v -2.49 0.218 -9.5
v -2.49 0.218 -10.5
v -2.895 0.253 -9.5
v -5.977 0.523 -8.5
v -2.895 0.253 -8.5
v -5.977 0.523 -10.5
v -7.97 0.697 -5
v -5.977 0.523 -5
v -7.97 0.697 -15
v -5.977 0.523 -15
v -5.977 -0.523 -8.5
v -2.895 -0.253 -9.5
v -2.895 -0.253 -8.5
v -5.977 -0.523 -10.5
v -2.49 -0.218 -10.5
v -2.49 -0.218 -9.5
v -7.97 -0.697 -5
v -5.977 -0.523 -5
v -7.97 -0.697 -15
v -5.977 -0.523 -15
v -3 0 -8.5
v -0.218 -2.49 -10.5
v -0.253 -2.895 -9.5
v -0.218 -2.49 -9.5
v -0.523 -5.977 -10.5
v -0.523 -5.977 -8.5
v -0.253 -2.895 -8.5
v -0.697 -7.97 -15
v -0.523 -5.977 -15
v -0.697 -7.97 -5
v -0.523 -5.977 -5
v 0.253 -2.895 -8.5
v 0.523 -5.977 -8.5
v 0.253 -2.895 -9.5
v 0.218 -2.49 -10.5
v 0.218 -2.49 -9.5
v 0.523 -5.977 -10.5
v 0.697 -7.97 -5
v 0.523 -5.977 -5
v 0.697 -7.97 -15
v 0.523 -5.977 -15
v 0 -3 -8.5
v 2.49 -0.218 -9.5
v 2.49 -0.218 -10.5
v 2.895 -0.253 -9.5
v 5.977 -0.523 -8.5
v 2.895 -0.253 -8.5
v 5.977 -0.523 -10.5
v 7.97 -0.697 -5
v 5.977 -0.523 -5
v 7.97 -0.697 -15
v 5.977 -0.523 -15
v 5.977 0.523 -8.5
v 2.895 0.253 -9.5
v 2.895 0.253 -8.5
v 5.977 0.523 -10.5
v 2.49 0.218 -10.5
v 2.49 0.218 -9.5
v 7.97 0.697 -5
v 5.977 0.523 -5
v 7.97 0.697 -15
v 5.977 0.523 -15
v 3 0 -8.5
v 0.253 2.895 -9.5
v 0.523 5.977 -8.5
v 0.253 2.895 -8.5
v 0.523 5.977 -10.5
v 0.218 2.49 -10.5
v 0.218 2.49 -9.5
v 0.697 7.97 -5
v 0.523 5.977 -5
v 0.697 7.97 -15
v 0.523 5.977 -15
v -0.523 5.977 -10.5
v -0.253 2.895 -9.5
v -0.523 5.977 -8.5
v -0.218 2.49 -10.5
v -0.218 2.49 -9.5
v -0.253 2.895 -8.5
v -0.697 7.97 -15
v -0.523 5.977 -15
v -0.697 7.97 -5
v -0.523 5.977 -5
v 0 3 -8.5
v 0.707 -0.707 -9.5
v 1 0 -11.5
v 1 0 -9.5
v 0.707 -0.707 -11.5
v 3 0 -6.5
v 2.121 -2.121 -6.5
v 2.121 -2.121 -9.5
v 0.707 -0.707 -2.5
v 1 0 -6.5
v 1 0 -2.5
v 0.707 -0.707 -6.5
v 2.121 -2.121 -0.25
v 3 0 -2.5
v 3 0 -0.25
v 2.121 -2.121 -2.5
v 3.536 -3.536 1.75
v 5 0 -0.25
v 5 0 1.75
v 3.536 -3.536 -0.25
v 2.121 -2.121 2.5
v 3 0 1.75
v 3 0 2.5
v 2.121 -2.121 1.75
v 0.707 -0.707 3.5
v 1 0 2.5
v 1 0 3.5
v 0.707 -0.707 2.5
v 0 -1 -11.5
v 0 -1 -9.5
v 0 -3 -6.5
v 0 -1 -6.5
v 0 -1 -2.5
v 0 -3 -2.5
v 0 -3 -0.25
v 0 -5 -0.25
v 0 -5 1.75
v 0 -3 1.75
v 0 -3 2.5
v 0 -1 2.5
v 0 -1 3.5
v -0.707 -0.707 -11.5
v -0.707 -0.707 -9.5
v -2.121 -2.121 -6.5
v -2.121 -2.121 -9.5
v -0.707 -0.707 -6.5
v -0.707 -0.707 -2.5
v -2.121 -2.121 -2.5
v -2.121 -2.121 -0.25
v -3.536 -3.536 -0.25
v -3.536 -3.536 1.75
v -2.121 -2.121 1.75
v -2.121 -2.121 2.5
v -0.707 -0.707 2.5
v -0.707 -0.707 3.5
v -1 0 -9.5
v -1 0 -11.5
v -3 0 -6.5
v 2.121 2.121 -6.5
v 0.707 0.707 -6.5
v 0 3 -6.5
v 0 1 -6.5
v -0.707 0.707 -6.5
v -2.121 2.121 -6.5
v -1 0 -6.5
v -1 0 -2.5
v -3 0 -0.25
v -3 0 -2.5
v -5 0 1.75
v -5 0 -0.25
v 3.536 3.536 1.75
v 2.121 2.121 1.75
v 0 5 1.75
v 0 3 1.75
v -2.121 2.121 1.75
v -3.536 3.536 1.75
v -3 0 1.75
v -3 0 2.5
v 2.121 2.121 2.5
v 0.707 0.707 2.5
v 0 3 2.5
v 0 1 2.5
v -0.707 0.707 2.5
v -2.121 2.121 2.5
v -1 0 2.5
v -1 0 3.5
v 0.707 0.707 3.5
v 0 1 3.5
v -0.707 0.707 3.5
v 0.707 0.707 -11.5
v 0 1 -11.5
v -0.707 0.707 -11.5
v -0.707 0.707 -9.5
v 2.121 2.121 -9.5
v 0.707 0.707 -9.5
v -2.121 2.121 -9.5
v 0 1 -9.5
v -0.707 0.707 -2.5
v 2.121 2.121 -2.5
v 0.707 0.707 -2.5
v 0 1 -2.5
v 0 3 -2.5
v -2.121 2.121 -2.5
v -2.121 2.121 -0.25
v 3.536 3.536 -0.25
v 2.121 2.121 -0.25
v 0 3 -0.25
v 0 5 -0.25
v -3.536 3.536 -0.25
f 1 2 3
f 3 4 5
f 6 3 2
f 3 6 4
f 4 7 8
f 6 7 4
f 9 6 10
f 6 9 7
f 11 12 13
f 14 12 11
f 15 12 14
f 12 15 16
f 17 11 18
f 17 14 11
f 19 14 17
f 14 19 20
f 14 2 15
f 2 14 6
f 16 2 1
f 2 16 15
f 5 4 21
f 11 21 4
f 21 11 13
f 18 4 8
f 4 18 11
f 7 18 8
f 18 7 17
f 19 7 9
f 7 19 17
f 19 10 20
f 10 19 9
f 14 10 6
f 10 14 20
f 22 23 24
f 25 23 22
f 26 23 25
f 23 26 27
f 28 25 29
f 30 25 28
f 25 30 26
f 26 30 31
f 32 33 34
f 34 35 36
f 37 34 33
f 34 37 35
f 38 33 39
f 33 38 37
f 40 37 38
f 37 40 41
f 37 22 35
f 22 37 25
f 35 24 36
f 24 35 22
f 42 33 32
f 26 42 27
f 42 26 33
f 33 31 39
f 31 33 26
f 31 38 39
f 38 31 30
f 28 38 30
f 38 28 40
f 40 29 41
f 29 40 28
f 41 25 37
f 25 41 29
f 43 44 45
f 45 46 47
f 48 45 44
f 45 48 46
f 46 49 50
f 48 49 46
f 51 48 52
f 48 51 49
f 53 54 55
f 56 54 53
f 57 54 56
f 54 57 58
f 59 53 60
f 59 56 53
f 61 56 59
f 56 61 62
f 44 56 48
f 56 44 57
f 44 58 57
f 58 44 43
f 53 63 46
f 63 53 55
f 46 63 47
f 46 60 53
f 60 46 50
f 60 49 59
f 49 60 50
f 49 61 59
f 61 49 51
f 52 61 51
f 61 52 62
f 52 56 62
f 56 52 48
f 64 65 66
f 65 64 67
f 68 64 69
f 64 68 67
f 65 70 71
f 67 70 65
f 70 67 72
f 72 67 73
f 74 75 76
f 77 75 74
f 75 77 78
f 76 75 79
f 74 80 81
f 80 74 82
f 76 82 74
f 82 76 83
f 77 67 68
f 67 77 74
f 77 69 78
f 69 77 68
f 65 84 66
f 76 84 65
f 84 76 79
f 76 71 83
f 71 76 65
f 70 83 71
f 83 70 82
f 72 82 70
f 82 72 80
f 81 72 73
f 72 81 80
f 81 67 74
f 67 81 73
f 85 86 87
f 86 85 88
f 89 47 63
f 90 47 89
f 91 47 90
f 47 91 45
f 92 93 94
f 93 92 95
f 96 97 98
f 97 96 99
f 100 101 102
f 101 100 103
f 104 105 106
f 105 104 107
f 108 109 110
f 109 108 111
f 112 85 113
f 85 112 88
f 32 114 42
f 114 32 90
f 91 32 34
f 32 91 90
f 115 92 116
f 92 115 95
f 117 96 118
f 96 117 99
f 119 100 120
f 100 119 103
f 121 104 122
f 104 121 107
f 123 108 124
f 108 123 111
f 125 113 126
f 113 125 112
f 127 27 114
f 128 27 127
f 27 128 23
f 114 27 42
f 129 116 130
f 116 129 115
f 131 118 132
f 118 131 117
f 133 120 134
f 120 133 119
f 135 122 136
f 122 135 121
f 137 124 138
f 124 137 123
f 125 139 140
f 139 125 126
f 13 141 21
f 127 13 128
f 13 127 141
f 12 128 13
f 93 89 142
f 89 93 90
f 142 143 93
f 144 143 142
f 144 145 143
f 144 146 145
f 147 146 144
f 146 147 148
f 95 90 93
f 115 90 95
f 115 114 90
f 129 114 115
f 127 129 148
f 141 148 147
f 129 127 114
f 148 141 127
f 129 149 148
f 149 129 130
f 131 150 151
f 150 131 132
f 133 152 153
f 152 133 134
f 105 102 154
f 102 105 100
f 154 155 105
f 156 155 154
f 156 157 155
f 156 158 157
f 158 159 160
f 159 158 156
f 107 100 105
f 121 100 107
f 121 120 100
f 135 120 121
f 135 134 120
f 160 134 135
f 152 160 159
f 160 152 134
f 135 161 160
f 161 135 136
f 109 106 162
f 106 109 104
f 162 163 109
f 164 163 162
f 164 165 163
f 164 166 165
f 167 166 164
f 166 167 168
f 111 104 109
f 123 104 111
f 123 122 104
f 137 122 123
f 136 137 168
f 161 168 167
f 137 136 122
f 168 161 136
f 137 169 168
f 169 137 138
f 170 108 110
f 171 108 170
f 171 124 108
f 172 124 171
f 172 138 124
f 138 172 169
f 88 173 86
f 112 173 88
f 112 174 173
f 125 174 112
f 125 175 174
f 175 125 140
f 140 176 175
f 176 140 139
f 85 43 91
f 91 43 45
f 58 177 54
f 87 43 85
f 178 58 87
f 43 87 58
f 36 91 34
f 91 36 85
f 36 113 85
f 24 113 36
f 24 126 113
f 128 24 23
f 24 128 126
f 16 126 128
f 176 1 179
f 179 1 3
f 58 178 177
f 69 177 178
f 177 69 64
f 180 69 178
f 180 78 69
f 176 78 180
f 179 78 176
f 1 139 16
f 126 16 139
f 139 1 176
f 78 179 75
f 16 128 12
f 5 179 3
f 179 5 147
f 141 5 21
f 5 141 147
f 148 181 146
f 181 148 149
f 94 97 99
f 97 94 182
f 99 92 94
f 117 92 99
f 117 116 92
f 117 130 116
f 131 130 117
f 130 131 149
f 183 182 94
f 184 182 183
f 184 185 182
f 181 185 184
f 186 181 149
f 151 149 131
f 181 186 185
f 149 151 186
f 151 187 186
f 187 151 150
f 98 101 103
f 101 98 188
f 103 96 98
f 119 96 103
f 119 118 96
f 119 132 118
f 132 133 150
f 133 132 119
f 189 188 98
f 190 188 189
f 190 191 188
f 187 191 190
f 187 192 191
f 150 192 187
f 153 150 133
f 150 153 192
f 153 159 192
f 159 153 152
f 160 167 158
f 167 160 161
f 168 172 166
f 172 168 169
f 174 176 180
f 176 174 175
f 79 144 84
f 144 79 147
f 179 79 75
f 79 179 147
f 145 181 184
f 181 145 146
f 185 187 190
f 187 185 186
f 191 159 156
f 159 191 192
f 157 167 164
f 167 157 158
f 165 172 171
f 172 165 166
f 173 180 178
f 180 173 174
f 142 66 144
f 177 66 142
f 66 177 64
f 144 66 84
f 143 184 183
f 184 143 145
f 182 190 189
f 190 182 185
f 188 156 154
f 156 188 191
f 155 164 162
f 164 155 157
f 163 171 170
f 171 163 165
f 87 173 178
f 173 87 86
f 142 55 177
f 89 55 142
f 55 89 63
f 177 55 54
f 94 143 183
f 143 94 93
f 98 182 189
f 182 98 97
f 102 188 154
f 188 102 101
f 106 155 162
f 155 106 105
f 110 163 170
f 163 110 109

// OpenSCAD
$fn=8;
rotate_extrude() {
  difference() {
    union() {
      square([6,5], center=true);
      translate([0,0.75]) {
        square([10,2], center=true);
      }
      translate([0, -4]) {
        square([2,15], center=true);
      }

      translate([0, -8]) {
        square([6,3], center=true);
      }
    }
    translate([0,-25]) {
      square([10, 50]);
    }
  }
}

// legs

for(i=[0:90:270]) {
  rotate([0,0,i-5]) {
    rotate_extrude(angle=10) {
      translate([-5, -9.5]) {
        square([5, 2], center=true);
      }

      translate([-7, -10]) {
        square([2,10], center=true);
      }
    }
  }
}
